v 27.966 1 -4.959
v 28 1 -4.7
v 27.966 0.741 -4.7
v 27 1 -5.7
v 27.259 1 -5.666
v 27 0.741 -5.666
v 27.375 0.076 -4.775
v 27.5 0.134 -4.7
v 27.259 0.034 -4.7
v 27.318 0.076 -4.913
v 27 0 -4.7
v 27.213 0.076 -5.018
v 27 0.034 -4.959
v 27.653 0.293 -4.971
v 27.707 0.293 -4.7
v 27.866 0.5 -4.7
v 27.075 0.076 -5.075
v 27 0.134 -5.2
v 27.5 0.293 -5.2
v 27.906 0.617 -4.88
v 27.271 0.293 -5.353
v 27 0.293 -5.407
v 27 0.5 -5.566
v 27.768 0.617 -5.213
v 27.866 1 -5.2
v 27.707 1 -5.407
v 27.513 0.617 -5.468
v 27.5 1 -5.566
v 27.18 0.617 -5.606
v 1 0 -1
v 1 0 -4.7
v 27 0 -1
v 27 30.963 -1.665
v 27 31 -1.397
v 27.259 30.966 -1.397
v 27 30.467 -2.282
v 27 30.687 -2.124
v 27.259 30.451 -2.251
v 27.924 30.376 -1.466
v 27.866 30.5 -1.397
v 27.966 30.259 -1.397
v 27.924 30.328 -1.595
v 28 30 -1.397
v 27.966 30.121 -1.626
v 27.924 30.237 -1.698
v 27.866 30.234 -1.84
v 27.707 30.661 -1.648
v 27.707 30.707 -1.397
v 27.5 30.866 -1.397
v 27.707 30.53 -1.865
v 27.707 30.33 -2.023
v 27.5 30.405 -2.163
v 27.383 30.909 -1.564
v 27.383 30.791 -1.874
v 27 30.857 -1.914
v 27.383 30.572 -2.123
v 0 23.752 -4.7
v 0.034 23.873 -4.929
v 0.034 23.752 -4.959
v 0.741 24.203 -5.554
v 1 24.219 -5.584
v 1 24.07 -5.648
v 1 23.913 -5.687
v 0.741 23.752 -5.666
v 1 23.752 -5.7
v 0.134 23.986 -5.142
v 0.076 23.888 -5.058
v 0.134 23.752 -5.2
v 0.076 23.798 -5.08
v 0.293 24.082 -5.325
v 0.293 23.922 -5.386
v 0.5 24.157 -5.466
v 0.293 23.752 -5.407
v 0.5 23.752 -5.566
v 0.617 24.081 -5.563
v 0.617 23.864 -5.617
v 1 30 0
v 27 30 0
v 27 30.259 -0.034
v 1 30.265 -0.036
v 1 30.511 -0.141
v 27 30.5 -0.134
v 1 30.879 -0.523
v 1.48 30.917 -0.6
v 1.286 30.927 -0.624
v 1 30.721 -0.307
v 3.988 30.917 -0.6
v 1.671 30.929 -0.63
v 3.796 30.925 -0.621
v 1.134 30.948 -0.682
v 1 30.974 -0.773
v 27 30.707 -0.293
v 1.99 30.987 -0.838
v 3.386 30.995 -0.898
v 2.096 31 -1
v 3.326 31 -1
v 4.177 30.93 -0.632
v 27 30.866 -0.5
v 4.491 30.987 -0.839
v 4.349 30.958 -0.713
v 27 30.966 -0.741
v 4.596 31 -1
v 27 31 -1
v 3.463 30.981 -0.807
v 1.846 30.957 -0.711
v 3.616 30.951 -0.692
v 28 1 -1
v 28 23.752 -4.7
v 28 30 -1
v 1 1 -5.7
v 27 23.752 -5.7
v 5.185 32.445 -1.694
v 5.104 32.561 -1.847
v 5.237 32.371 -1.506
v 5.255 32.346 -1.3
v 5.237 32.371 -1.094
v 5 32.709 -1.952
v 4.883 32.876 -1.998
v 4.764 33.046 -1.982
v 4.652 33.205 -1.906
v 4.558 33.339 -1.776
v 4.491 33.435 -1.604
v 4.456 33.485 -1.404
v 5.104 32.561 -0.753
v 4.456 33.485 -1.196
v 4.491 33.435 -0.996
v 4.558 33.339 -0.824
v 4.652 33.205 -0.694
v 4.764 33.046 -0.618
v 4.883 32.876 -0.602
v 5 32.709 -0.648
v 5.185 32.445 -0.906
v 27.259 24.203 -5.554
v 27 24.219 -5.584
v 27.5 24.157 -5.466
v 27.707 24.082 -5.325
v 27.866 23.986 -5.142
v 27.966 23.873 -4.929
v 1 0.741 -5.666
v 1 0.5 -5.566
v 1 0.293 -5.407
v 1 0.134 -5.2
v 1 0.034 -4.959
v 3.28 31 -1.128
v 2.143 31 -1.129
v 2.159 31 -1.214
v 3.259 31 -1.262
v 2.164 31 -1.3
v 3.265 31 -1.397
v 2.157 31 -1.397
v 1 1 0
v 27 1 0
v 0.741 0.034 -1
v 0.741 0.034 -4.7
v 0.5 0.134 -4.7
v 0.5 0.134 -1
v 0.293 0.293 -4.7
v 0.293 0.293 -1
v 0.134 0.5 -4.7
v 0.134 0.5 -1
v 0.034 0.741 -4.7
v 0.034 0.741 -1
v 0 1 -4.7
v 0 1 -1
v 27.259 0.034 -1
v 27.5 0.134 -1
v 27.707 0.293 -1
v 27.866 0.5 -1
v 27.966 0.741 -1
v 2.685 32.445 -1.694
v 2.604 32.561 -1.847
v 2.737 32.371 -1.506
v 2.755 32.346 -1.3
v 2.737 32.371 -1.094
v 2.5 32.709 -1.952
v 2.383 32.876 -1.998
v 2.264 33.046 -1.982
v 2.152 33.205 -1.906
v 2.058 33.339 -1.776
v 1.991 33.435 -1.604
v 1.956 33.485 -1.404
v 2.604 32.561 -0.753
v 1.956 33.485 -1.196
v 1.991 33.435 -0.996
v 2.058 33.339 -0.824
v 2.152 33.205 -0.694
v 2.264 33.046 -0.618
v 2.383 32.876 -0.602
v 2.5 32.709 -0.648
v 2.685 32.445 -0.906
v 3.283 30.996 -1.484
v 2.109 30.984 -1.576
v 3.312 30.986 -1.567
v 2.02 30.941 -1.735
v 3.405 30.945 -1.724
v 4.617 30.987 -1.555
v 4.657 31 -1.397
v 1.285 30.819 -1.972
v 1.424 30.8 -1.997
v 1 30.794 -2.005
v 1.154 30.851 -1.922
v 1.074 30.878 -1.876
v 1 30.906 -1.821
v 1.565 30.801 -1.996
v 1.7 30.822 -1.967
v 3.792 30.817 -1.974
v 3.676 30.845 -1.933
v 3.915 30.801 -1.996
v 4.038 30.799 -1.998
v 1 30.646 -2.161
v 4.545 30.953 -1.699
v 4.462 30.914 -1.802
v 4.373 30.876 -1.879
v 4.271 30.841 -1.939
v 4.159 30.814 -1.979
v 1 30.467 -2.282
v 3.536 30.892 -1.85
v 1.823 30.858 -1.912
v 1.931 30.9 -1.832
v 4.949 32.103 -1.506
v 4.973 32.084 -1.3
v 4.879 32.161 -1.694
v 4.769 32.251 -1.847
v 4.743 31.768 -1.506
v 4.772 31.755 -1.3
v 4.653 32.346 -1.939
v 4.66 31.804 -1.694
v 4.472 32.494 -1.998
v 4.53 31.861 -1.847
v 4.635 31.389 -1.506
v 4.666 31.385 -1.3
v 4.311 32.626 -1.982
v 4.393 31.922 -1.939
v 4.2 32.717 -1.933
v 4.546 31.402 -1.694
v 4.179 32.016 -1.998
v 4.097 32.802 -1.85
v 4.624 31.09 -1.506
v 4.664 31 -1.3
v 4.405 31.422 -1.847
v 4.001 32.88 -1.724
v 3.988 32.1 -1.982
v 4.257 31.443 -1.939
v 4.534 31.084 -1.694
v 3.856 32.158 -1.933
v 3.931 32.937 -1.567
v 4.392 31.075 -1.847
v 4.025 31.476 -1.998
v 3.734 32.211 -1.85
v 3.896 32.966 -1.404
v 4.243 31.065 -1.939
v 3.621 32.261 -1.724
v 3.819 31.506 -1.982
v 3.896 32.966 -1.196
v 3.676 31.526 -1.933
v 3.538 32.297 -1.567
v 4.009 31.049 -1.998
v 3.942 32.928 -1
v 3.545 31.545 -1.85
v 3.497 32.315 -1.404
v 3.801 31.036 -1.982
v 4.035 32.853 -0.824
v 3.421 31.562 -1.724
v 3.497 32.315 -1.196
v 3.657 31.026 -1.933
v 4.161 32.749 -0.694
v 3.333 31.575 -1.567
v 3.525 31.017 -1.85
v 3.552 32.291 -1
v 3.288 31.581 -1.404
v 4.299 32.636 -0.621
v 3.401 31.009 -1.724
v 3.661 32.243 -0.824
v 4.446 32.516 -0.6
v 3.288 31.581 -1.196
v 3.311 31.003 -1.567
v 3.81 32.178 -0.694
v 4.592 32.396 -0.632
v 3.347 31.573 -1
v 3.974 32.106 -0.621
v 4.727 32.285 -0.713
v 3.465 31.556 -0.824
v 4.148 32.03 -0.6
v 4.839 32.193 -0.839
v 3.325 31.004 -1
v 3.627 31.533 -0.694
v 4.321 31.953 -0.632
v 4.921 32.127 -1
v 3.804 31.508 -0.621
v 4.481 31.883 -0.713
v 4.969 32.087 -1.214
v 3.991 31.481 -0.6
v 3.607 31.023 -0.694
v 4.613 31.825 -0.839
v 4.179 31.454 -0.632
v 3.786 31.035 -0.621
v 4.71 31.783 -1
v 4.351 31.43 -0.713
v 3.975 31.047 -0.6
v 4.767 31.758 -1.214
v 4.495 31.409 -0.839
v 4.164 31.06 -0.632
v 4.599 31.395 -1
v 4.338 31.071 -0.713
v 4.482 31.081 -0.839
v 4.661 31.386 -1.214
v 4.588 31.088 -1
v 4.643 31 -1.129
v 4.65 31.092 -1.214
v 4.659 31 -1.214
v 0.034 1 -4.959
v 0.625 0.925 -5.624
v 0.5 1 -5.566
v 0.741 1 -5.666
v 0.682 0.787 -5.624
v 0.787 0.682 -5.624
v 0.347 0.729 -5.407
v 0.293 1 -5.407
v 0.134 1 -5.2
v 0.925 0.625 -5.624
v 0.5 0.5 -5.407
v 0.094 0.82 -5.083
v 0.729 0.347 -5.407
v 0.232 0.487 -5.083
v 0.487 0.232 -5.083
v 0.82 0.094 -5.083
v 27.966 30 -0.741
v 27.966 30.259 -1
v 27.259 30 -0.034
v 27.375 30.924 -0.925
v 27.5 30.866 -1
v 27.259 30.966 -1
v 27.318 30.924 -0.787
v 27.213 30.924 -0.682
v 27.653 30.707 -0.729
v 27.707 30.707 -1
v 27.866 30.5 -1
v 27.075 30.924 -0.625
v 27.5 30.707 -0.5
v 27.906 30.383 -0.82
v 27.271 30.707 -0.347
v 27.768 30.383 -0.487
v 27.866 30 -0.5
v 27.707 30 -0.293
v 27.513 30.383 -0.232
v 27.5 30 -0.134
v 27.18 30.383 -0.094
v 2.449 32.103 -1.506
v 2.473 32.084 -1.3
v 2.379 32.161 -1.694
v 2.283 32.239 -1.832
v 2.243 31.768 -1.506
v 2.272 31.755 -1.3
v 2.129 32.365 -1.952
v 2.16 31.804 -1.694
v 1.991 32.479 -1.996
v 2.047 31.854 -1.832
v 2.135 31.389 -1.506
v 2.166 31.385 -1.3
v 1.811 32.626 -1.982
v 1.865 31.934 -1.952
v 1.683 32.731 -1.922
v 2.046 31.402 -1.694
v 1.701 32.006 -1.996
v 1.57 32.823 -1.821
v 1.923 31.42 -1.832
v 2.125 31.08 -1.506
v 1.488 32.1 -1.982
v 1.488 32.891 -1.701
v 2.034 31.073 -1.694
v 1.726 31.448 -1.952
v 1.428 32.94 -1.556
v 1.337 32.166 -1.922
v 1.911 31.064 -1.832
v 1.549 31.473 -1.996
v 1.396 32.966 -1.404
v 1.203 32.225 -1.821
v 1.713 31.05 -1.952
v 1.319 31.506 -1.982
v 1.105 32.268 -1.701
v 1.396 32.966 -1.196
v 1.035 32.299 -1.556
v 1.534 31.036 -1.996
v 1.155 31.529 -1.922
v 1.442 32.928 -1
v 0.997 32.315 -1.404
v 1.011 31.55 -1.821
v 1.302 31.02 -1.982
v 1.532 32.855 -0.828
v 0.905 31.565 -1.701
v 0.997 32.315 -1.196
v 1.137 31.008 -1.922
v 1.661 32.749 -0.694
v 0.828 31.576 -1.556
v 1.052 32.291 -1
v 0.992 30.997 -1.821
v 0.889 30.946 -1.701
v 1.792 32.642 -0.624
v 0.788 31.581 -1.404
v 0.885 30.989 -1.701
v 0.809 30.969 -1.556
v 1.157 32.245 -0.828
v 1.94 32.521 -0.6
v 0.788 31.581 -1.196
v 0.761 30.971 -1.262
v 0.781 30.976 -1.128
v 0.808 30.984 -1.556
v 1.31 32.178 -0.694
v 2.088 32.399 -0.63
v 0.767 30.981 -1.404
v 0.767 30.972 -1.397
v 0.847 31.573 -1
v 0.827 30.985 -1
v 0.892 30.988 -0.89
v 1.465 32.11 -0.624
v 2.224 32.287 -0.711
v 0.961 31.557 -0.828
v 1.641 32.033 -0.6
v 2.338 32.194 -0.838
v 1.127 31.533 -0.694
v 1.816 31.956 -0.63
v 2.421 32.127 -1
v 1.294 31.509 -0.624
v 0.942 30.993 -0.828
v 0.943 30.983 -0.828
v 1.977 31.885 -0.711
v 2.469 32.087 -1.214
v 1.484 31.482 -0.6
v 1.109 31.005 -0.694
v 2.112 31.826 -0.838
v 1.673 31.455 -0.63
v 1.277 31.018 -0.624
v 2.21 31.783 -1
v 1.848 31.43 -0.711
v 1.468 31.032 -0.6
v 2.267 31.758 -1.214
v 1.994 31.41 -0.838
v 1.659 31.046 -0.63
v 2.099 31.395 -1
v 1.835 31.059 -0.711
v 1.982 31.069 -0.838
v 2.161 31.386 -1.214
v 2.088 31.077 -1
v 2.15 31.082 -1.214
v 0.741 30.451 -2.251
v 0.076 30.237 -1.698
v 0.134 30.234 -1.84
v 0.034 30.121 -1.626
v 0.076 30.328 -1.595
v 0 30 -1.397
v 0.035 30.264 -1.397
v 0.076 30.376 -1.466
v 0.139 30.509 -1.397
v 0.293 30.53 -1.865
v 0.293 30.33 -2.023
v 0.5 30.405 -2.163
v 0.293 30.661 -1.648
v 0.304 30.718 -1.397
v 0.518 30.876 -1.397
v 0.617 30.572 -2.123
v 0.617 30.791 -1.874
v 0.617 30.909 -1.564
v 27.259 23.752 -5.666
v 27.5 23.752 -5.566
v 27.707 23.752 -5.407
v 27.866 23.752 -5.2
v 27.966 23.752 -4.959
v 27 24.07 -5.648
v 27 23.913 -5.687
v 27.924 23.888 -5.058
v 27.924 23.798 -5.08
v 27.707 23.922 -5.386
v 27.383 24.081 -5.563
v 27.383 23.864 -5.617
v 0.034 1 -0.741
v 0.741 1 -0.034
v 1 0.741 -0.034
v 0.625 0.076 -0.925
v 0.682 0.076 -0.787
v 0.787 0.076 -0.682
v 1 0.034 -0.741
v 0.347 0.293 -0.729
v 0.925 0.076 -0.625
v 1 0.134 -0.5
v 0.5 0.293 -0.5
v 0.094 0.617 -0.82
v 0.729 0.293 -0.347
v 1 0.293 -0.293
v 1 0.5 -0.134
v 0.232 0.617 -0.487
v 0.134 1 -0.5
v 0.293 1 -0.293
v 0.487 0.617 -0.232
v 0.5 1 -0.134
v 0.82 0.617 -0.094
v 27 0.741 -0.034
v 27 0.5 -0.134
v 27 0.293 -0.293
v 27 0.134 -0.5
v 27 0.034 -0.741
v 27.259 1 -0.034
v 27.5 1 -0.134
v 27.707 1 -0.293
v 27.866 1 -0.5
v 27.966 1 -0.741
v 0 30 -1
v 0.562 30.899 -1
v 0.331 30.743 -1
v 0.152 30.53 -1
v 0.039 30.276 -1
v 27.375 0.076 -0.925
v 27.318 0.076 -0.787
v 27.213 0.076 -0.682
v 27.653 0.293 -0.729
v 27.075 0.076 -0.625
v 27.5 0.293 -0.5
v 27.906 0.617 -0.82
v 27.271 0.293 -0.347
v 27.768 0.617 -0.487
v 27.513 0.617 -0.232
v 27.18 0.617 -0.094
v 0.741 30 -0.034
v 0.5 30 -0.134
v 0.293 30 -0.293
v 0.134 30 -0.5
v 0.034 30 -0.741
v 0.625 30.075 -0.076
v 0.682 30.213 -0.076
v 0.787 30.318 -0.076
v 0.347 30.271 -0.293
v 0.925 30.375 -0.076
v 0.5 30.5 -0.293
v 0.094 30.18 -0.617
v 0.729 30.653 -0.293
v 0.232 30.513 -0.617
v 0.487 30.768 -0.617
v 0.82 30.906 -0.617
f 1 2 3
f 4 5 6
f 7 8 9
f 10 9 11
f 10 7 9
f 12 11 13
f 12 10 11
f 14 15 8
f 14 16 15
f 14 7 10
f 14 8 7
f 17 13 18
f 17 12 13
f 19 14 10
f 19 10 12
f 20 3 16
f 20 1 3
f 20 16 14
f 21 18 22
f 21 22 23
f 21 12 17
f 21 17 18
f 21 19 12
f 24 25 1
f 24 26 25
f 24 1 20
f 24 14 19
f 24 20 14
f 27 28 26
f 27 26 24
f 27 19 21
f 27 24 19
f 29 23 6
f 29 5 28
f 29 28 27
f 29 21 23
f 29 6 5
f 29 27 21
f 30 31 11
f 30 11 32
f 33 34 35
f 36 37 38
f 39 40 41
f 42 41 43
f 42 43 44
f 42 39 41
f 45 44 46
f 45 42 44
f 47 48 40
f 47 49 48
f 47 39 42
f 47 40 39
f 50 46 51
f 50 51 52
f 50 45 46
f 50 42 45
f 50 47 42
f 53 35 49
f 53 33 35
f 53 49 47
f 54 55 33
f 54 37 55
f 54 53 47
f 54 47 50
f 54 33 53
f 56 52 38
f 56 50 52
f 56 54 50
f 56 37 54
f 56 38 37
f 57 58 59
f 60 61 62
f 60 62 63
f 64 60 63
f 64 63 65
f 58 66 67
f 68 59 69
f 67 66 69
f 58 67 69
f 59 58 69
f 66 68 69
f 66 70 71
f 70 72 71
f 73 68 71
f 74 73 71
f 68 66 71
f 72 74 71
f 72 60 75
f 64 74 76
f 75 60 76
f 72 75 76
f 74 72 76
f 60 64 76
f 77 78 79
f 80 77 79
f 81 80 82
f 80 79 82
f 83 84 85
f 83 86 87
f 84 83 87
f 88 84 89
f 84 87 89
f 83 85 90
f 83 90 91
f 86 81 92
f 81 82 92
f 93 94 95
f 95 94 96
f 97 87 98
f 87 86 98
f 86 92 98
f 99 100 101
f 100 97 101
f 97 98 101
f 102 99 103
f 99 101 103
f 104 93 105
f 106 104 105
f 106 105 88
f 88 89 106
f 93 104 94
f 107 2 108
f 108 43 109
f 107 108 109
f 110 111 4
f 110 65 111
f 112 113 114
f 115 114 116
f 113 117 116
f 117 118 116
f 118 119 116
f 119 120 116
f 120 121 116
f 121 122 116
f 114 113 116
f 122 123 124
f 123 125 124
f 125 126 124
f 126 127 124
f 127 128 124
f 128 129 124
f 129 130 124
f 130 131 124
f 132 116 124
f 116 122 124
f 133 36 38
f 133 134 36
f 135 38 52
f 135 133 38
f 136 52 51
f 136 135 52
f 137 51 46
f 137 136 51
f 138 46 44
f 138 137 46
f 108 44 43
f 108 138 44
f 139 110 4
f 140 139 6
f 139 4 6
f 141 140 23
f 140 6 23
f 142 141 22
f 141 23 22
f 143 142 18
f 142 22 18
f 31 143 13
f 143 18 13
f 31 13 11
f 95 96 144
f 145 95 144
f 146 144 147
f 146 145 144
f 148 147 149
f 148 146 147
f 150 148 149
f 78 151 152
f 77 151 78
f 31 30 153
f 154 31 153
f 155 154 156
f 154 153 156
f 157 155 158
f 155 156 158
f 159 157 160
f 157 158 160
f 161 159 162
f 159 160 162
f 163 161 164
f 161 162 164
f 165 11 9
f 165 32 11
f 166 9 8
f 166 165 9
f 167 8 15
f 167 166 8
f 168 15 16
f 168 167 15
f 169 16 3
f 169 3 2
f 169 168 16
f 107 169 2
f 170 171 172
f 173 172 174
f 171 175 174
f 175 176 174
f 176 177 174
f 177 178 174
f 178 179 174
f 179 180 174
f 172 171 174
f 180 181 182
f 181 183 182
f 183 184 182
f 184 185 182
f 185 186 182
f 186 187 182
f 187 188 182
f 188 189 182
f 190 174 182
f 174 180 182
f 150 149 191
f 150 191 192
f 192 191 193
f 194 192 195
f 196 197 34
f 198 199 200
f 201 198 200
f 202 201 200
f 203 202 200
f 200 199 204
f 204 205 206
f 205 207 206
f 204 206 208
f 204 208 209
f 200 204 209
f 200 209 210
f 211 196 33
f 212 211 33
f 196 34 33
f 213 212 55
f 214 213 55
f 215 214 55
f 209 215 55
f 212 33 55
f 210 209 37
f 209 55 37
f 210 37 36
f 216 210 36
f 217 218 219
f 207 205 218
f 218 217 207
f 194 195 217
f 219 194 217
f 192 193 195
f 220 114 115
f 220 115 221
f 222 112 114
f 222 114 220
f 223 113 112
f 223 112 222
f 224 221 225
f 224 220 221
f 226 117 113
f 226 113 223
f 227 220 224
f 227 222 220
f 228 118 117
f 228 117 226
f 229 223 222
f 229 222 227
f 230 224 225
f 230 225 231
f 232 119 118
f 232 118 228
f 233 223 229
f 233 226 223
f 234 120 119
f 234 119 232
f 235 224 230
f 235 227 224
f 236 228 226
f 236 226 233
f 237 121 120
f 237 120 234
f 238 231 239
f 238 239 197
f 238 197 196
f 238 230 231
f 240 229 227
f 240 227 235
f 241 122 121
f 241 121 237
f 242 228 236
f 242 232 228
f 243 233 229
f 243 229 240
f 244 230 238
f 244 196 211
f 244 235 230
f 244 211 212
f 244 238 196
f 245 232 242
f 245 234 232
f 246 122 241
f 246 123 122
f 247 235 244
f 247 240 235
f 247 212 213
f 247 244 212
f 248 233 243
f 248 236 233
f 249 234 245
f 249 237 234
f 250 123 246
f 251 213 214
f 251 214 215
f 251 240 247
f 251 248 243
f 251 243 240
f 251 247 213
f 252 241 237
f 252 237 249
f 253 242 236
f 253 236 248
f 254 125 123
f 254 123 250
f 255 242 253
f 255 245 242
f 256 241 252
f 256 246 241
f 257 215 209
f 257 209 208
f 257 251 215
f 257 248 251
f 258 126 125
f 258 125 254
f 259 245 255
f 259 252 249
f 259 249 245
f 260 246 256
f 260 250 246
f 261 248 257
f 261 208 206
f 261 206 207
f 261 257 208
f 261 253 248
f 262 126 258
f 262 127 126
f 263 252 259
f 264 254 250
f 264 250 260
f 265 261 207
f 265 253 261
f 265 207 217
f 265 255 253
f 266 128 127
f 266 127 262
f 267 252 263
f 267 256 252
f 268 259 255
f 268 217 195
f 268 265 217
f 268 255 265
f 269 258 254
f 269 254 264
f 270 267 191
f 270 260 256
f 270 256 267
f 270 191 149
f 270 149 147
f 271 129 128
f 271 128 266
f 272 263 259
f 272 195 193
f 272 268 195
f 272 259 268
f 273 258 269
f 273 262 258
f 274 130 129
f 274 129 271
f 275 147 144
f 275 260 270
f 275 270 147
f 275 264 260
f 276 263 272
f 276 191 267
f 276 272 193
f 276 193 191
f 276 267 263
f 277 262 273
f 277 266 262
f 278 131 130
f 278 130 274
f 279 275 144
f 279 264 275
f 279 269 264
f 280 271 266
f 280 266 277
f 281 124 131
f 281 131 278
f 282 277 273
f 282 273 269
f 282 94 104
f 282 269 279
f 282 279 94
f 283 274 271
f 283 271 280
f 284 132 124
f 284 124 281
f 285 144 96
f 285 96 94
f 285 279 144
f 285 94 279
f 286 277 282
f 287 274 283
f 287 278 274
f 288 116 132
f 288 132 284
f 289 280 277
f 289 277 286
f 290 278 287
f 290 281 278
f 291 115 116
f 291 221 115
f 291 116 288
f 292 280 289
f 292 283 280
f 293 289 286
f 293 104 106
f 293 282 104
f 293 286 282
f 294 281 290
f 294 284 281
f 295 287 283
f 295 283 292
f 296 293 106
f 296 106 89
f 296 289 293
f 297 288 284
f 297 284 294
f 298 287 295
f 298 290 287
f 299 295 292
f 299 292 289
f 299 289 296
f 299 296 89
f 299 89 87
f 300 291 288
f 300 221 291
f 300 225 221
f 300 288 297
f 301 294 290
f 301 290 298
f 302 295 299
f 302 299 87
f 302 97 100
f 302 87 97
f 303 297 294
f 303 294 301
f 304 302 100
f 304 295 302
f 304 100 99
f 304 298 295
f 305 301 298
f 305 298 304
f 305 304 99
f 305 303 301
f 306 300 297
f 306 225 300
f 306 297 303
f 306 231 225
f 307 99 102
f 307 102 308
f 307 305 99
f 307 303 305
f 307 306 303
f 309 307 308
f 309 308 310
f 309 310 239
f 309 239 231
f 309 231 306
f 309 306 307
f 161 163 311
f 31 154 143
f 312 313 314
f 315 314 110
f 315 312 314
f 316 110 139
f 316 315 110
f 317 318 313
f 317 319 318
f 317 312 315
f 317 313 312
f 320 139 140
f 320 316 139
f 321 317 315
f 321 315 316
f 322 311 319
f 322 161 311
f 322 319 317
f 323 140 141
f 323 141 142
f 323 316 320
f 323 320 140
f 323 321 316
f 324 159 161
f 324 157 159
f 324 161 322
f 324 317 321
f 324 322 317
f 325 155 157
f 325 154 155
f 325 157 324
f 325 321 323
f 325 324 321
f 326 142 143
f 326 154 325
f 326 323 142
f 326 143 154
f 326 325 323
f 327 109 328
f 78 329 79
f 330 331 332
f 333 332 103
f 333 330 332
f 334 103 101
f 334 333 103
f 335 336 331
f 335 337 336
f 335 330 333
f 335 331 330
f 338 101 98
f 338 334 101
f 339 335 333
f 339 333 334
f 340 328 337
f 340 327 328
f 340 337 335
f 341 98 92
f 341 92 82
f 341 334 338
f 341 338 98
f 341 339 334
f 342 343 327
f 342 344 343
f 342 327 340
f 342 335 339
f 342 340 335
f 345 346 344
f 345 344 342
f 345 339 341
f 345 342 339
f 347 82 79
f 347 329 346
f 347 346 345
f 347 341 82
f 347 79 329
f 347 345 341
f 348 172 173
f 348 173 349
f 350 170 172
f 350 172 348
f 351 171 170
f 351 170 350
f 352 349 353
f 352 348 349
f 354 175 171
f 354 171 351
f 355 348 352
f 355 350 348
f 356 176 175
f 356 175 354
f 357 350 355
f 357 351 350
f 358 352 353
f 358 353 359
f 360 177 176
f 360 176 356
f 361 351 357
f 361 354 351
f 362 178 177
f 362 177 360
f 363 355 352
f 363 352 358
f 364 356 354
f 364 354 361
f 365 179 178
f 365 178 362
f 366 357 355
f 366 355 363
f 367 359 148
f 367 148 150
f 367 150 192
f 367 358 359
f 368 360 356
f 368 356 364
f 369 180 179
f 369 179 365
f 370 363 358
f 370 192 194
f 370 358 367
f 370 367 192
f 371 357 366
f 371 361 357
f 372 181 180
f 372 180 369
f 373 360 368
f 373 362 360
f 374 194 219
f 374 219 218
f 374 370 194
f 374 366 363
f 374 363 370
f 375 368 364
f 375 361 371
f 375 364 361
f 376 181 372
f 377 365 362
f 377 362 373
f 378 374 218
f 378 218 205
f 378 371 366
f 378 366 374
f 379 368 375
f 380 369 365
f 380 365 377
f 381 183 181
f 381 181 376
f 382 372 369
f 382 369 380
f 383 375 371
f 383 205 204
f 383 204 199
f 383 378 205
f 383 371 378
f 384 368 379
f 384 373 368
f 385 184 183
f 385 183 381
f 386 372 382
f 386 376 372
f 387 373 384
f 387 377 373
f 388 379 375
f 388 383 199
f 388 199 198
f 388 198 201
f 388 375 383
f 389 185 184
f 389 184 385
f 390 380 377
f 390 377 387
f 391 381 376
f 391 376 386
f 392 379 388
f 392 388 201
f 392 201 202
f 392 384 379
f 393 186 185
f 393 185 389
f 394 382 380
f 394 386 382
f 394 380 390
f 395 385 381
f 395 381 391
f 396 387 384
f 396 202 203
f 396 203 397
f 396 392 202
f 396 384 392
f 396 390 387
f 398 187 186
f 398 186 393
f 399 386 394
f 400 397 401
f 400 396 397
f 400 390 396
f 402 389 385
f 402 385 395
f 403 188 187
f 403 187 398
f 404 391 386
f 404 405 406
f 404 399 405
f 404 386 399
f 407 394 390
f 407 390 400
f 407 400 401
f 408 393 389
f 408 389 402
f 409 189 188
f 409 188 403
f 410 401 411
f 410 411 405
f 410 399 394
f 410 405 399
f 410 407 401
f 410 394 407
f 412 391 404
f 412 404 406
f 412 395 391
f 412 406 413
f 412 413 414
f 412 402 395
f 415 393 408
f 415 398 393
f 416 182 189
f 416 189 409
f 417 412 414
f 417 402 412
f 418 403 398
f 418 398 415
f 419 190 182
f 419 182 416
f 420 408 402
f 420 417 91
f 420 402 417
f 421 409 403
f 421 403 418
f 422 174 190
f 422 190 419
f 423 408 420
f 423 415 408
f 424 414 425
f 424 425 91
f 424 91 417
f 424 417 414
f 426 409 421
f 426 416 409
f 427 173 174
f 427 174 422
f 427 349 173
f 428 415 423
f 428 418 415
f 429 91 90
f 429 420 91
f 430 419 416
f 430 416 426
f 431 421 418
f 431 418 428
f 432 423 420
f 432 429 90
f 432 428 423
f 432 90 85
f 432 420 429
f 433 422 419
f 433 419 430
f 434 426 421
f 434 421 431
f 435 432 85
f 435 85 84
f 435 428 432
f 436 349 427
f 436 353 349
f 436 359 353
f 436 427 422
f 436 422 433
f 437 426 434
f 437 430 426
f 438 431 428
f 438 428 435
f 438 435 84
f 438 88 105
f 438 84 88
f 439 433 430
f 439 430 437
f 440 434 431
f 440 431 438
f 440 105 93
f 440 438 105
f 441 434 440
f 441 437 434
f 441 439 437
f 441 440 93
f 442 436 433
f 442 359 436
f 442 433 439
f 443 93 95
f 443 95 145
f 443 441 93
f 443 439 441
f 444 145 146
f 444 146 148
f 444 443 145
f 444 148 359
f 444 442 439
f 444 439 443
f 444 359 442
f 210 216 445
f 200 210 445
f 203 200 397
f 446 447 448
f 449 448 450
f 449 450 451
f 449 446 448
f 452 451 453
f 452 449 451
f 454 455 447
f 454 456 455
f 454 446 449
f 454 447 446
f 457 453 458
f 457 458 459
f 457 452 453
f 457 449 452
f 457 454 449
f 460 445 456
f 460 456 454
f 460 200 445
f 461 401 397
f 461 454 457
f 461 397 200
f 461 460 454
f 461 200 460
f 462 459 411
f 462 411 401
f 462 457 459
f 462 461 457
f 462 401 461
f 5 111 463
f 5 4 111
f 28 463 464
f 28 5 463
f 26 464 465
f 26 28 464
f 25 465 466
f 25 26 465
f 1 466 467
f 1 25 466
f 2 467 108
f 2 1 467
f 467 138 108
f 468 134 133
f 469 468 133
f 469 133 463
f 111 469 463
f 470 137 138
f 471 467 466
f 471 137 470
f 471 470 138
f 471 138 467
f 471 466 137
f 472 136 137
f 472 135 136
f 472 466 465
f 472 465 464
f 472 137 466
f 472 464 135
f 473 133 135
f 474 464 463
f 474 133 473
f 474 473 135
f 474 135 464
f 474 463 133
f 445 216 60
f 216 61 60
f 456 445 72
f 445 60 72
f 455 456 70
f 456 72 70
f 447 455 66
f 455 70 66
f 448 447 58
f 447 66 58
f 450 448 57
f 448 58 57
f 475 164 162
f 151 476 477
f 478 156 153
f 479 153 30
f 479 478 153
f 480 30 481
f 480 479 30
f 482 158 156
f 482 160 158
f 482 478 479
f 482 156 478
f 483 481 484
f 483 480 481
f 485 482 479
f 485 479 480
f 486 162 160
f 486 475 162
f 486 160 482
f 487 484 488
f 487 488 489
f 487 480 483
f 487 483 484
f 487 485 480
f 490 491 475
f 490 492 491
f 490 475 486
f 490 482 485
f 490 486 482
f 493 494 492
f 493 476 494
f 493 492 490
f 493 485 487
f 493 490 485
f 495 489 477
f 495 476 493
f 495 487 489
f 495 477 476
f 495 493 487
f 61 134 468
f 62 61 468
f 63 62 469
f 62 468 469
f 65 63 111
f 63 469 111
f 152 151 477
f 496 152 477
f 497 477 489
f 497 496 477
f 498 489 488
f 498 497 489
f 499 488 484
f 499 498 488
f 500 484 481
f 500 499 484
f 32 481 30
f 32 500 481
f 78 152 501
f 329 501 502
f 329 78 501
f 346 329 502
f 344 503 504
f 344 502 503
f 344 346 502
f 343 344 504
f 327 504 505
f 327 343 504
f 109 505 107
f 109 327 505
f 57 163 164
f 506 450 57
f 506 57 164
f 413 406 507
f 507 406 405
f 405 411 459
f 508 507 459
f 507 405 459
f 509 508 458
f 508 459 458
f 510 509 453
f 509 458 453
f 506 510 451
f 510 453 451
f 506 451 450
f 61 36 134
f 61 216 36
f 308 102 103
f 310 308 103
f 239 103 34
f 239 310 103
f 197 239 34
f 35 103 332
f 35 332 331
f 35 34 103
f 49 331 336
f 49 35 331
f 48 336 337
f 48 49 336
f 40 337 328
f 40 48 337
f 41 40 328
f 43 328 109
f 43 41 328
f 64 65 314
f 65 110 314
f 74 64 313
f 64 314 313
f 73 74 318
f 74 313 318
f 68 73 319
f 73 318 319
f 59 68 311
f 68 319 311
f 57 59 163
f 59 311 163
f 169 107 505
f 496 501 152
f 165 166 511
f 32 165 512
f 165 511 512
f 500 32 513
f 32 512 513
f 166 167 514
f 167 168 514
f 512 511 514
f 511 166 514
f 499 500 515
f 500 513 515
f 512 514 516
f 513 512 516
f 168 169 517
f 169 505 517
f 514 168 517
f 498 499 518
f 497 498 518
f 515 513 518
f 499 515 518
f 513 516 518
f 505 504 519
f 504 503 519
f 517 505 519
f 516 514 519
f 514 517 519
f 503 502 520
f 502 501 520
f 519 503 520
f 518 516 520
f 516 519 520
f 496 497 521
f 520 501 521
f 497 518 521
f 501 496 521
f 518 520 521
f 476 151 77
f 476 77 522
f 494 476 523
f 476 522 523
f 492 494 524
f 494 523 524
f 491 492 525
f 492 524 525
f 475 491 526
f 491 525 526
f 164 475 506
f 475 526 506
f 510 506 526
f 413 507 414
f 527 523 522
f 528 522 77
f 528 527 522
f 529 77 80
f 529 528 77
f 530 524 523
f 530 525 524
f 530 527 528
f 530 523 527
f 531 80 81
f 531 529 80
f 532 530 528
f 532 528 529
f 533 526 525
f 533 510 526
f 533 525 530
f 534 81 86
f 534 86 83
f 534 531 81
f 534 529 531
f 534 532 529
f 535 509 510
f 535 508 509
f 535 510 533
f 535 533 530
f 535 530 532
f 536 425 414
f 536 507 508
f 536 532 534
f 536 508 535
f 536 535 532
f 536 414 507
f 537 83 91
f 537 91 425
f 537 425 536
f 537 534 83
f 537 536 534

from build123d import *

# Parameters (mm, degrees)
BOSS_EXTRUDE1_DEPTH = 28
FILLET1_R           = 1
SWEEP1_PROFILE_R    = 0.7
LPATTERN1_COUNT     = 2
LPATTERN1_PITCH     = 2.5


with BuildPart() as part:
    # Sketch1 → Boss-Extrude1 (new body)
    with BuildSketch(Plane(origin=(0, 0, 0), x_dir=(0, 0, -1), z_dir=(1, 0, 0))):
        Polygon((0, 0), (0, 31), (2, 31), (5.7, 24), (5.7, 0), align=None)
    extrude(amount=BOSS_EXTRUDE1_DEPTH)

    # Fillet1
    fillet1_edges = [part.edges().sort_by_distance(p)[0] for p in [
        (28, 15.5, 0),
        (28, 31, -1),
        (28, 27.5, -3.85),
        (28, 12, -5.7),
        (0, 27.5, -3.85),
        (0, 31, -1),
        (0, 15.5, 0),
        (0, 0, -2.85),
        (0, 12, -5.7),
        (28, 0, -2.85),
        (14, 24, -5.7),
        (14, 31, -2),
        (14, 31, 0),
        (14, 0, 0),
        (14, 0, -5.7),
    ]]
    fillet(fillet1_edges, radius=FILLET1_R)

    # Sweep1: sweep along a path in Sketch2
    with BuildLine(Plane.XY.offset(-1.3)) as sweep1_path:
        ThreePointArc((2.353185581, 32.918653967), (1.45227767, 31.219358637), (2.297855958, 29.491864196))
    # Sweep1 profile (on start of the path) → Sweep1 (sweep)
    with BuildSketch(Plane(origin=(2.353185581, 32.918653967, -1.3), x_dir=(0.5744773116902536, -0.8185205057621582, 0), z_dir=(-0.8185205057621582, -0.5744773116902536, 0))):
        Circle(SWEEP1_PROFILE_R)
    sweep1 = sweep(path=sweep1_path.line)

    # LPattern1: Sweep1 ×2
    with Locations(*[(i * LPATTERN1_PITCH, 0, 0) for i in range(1, LPATTERN1_COUNT)]):
        add(sweep1)


solid = part.part
